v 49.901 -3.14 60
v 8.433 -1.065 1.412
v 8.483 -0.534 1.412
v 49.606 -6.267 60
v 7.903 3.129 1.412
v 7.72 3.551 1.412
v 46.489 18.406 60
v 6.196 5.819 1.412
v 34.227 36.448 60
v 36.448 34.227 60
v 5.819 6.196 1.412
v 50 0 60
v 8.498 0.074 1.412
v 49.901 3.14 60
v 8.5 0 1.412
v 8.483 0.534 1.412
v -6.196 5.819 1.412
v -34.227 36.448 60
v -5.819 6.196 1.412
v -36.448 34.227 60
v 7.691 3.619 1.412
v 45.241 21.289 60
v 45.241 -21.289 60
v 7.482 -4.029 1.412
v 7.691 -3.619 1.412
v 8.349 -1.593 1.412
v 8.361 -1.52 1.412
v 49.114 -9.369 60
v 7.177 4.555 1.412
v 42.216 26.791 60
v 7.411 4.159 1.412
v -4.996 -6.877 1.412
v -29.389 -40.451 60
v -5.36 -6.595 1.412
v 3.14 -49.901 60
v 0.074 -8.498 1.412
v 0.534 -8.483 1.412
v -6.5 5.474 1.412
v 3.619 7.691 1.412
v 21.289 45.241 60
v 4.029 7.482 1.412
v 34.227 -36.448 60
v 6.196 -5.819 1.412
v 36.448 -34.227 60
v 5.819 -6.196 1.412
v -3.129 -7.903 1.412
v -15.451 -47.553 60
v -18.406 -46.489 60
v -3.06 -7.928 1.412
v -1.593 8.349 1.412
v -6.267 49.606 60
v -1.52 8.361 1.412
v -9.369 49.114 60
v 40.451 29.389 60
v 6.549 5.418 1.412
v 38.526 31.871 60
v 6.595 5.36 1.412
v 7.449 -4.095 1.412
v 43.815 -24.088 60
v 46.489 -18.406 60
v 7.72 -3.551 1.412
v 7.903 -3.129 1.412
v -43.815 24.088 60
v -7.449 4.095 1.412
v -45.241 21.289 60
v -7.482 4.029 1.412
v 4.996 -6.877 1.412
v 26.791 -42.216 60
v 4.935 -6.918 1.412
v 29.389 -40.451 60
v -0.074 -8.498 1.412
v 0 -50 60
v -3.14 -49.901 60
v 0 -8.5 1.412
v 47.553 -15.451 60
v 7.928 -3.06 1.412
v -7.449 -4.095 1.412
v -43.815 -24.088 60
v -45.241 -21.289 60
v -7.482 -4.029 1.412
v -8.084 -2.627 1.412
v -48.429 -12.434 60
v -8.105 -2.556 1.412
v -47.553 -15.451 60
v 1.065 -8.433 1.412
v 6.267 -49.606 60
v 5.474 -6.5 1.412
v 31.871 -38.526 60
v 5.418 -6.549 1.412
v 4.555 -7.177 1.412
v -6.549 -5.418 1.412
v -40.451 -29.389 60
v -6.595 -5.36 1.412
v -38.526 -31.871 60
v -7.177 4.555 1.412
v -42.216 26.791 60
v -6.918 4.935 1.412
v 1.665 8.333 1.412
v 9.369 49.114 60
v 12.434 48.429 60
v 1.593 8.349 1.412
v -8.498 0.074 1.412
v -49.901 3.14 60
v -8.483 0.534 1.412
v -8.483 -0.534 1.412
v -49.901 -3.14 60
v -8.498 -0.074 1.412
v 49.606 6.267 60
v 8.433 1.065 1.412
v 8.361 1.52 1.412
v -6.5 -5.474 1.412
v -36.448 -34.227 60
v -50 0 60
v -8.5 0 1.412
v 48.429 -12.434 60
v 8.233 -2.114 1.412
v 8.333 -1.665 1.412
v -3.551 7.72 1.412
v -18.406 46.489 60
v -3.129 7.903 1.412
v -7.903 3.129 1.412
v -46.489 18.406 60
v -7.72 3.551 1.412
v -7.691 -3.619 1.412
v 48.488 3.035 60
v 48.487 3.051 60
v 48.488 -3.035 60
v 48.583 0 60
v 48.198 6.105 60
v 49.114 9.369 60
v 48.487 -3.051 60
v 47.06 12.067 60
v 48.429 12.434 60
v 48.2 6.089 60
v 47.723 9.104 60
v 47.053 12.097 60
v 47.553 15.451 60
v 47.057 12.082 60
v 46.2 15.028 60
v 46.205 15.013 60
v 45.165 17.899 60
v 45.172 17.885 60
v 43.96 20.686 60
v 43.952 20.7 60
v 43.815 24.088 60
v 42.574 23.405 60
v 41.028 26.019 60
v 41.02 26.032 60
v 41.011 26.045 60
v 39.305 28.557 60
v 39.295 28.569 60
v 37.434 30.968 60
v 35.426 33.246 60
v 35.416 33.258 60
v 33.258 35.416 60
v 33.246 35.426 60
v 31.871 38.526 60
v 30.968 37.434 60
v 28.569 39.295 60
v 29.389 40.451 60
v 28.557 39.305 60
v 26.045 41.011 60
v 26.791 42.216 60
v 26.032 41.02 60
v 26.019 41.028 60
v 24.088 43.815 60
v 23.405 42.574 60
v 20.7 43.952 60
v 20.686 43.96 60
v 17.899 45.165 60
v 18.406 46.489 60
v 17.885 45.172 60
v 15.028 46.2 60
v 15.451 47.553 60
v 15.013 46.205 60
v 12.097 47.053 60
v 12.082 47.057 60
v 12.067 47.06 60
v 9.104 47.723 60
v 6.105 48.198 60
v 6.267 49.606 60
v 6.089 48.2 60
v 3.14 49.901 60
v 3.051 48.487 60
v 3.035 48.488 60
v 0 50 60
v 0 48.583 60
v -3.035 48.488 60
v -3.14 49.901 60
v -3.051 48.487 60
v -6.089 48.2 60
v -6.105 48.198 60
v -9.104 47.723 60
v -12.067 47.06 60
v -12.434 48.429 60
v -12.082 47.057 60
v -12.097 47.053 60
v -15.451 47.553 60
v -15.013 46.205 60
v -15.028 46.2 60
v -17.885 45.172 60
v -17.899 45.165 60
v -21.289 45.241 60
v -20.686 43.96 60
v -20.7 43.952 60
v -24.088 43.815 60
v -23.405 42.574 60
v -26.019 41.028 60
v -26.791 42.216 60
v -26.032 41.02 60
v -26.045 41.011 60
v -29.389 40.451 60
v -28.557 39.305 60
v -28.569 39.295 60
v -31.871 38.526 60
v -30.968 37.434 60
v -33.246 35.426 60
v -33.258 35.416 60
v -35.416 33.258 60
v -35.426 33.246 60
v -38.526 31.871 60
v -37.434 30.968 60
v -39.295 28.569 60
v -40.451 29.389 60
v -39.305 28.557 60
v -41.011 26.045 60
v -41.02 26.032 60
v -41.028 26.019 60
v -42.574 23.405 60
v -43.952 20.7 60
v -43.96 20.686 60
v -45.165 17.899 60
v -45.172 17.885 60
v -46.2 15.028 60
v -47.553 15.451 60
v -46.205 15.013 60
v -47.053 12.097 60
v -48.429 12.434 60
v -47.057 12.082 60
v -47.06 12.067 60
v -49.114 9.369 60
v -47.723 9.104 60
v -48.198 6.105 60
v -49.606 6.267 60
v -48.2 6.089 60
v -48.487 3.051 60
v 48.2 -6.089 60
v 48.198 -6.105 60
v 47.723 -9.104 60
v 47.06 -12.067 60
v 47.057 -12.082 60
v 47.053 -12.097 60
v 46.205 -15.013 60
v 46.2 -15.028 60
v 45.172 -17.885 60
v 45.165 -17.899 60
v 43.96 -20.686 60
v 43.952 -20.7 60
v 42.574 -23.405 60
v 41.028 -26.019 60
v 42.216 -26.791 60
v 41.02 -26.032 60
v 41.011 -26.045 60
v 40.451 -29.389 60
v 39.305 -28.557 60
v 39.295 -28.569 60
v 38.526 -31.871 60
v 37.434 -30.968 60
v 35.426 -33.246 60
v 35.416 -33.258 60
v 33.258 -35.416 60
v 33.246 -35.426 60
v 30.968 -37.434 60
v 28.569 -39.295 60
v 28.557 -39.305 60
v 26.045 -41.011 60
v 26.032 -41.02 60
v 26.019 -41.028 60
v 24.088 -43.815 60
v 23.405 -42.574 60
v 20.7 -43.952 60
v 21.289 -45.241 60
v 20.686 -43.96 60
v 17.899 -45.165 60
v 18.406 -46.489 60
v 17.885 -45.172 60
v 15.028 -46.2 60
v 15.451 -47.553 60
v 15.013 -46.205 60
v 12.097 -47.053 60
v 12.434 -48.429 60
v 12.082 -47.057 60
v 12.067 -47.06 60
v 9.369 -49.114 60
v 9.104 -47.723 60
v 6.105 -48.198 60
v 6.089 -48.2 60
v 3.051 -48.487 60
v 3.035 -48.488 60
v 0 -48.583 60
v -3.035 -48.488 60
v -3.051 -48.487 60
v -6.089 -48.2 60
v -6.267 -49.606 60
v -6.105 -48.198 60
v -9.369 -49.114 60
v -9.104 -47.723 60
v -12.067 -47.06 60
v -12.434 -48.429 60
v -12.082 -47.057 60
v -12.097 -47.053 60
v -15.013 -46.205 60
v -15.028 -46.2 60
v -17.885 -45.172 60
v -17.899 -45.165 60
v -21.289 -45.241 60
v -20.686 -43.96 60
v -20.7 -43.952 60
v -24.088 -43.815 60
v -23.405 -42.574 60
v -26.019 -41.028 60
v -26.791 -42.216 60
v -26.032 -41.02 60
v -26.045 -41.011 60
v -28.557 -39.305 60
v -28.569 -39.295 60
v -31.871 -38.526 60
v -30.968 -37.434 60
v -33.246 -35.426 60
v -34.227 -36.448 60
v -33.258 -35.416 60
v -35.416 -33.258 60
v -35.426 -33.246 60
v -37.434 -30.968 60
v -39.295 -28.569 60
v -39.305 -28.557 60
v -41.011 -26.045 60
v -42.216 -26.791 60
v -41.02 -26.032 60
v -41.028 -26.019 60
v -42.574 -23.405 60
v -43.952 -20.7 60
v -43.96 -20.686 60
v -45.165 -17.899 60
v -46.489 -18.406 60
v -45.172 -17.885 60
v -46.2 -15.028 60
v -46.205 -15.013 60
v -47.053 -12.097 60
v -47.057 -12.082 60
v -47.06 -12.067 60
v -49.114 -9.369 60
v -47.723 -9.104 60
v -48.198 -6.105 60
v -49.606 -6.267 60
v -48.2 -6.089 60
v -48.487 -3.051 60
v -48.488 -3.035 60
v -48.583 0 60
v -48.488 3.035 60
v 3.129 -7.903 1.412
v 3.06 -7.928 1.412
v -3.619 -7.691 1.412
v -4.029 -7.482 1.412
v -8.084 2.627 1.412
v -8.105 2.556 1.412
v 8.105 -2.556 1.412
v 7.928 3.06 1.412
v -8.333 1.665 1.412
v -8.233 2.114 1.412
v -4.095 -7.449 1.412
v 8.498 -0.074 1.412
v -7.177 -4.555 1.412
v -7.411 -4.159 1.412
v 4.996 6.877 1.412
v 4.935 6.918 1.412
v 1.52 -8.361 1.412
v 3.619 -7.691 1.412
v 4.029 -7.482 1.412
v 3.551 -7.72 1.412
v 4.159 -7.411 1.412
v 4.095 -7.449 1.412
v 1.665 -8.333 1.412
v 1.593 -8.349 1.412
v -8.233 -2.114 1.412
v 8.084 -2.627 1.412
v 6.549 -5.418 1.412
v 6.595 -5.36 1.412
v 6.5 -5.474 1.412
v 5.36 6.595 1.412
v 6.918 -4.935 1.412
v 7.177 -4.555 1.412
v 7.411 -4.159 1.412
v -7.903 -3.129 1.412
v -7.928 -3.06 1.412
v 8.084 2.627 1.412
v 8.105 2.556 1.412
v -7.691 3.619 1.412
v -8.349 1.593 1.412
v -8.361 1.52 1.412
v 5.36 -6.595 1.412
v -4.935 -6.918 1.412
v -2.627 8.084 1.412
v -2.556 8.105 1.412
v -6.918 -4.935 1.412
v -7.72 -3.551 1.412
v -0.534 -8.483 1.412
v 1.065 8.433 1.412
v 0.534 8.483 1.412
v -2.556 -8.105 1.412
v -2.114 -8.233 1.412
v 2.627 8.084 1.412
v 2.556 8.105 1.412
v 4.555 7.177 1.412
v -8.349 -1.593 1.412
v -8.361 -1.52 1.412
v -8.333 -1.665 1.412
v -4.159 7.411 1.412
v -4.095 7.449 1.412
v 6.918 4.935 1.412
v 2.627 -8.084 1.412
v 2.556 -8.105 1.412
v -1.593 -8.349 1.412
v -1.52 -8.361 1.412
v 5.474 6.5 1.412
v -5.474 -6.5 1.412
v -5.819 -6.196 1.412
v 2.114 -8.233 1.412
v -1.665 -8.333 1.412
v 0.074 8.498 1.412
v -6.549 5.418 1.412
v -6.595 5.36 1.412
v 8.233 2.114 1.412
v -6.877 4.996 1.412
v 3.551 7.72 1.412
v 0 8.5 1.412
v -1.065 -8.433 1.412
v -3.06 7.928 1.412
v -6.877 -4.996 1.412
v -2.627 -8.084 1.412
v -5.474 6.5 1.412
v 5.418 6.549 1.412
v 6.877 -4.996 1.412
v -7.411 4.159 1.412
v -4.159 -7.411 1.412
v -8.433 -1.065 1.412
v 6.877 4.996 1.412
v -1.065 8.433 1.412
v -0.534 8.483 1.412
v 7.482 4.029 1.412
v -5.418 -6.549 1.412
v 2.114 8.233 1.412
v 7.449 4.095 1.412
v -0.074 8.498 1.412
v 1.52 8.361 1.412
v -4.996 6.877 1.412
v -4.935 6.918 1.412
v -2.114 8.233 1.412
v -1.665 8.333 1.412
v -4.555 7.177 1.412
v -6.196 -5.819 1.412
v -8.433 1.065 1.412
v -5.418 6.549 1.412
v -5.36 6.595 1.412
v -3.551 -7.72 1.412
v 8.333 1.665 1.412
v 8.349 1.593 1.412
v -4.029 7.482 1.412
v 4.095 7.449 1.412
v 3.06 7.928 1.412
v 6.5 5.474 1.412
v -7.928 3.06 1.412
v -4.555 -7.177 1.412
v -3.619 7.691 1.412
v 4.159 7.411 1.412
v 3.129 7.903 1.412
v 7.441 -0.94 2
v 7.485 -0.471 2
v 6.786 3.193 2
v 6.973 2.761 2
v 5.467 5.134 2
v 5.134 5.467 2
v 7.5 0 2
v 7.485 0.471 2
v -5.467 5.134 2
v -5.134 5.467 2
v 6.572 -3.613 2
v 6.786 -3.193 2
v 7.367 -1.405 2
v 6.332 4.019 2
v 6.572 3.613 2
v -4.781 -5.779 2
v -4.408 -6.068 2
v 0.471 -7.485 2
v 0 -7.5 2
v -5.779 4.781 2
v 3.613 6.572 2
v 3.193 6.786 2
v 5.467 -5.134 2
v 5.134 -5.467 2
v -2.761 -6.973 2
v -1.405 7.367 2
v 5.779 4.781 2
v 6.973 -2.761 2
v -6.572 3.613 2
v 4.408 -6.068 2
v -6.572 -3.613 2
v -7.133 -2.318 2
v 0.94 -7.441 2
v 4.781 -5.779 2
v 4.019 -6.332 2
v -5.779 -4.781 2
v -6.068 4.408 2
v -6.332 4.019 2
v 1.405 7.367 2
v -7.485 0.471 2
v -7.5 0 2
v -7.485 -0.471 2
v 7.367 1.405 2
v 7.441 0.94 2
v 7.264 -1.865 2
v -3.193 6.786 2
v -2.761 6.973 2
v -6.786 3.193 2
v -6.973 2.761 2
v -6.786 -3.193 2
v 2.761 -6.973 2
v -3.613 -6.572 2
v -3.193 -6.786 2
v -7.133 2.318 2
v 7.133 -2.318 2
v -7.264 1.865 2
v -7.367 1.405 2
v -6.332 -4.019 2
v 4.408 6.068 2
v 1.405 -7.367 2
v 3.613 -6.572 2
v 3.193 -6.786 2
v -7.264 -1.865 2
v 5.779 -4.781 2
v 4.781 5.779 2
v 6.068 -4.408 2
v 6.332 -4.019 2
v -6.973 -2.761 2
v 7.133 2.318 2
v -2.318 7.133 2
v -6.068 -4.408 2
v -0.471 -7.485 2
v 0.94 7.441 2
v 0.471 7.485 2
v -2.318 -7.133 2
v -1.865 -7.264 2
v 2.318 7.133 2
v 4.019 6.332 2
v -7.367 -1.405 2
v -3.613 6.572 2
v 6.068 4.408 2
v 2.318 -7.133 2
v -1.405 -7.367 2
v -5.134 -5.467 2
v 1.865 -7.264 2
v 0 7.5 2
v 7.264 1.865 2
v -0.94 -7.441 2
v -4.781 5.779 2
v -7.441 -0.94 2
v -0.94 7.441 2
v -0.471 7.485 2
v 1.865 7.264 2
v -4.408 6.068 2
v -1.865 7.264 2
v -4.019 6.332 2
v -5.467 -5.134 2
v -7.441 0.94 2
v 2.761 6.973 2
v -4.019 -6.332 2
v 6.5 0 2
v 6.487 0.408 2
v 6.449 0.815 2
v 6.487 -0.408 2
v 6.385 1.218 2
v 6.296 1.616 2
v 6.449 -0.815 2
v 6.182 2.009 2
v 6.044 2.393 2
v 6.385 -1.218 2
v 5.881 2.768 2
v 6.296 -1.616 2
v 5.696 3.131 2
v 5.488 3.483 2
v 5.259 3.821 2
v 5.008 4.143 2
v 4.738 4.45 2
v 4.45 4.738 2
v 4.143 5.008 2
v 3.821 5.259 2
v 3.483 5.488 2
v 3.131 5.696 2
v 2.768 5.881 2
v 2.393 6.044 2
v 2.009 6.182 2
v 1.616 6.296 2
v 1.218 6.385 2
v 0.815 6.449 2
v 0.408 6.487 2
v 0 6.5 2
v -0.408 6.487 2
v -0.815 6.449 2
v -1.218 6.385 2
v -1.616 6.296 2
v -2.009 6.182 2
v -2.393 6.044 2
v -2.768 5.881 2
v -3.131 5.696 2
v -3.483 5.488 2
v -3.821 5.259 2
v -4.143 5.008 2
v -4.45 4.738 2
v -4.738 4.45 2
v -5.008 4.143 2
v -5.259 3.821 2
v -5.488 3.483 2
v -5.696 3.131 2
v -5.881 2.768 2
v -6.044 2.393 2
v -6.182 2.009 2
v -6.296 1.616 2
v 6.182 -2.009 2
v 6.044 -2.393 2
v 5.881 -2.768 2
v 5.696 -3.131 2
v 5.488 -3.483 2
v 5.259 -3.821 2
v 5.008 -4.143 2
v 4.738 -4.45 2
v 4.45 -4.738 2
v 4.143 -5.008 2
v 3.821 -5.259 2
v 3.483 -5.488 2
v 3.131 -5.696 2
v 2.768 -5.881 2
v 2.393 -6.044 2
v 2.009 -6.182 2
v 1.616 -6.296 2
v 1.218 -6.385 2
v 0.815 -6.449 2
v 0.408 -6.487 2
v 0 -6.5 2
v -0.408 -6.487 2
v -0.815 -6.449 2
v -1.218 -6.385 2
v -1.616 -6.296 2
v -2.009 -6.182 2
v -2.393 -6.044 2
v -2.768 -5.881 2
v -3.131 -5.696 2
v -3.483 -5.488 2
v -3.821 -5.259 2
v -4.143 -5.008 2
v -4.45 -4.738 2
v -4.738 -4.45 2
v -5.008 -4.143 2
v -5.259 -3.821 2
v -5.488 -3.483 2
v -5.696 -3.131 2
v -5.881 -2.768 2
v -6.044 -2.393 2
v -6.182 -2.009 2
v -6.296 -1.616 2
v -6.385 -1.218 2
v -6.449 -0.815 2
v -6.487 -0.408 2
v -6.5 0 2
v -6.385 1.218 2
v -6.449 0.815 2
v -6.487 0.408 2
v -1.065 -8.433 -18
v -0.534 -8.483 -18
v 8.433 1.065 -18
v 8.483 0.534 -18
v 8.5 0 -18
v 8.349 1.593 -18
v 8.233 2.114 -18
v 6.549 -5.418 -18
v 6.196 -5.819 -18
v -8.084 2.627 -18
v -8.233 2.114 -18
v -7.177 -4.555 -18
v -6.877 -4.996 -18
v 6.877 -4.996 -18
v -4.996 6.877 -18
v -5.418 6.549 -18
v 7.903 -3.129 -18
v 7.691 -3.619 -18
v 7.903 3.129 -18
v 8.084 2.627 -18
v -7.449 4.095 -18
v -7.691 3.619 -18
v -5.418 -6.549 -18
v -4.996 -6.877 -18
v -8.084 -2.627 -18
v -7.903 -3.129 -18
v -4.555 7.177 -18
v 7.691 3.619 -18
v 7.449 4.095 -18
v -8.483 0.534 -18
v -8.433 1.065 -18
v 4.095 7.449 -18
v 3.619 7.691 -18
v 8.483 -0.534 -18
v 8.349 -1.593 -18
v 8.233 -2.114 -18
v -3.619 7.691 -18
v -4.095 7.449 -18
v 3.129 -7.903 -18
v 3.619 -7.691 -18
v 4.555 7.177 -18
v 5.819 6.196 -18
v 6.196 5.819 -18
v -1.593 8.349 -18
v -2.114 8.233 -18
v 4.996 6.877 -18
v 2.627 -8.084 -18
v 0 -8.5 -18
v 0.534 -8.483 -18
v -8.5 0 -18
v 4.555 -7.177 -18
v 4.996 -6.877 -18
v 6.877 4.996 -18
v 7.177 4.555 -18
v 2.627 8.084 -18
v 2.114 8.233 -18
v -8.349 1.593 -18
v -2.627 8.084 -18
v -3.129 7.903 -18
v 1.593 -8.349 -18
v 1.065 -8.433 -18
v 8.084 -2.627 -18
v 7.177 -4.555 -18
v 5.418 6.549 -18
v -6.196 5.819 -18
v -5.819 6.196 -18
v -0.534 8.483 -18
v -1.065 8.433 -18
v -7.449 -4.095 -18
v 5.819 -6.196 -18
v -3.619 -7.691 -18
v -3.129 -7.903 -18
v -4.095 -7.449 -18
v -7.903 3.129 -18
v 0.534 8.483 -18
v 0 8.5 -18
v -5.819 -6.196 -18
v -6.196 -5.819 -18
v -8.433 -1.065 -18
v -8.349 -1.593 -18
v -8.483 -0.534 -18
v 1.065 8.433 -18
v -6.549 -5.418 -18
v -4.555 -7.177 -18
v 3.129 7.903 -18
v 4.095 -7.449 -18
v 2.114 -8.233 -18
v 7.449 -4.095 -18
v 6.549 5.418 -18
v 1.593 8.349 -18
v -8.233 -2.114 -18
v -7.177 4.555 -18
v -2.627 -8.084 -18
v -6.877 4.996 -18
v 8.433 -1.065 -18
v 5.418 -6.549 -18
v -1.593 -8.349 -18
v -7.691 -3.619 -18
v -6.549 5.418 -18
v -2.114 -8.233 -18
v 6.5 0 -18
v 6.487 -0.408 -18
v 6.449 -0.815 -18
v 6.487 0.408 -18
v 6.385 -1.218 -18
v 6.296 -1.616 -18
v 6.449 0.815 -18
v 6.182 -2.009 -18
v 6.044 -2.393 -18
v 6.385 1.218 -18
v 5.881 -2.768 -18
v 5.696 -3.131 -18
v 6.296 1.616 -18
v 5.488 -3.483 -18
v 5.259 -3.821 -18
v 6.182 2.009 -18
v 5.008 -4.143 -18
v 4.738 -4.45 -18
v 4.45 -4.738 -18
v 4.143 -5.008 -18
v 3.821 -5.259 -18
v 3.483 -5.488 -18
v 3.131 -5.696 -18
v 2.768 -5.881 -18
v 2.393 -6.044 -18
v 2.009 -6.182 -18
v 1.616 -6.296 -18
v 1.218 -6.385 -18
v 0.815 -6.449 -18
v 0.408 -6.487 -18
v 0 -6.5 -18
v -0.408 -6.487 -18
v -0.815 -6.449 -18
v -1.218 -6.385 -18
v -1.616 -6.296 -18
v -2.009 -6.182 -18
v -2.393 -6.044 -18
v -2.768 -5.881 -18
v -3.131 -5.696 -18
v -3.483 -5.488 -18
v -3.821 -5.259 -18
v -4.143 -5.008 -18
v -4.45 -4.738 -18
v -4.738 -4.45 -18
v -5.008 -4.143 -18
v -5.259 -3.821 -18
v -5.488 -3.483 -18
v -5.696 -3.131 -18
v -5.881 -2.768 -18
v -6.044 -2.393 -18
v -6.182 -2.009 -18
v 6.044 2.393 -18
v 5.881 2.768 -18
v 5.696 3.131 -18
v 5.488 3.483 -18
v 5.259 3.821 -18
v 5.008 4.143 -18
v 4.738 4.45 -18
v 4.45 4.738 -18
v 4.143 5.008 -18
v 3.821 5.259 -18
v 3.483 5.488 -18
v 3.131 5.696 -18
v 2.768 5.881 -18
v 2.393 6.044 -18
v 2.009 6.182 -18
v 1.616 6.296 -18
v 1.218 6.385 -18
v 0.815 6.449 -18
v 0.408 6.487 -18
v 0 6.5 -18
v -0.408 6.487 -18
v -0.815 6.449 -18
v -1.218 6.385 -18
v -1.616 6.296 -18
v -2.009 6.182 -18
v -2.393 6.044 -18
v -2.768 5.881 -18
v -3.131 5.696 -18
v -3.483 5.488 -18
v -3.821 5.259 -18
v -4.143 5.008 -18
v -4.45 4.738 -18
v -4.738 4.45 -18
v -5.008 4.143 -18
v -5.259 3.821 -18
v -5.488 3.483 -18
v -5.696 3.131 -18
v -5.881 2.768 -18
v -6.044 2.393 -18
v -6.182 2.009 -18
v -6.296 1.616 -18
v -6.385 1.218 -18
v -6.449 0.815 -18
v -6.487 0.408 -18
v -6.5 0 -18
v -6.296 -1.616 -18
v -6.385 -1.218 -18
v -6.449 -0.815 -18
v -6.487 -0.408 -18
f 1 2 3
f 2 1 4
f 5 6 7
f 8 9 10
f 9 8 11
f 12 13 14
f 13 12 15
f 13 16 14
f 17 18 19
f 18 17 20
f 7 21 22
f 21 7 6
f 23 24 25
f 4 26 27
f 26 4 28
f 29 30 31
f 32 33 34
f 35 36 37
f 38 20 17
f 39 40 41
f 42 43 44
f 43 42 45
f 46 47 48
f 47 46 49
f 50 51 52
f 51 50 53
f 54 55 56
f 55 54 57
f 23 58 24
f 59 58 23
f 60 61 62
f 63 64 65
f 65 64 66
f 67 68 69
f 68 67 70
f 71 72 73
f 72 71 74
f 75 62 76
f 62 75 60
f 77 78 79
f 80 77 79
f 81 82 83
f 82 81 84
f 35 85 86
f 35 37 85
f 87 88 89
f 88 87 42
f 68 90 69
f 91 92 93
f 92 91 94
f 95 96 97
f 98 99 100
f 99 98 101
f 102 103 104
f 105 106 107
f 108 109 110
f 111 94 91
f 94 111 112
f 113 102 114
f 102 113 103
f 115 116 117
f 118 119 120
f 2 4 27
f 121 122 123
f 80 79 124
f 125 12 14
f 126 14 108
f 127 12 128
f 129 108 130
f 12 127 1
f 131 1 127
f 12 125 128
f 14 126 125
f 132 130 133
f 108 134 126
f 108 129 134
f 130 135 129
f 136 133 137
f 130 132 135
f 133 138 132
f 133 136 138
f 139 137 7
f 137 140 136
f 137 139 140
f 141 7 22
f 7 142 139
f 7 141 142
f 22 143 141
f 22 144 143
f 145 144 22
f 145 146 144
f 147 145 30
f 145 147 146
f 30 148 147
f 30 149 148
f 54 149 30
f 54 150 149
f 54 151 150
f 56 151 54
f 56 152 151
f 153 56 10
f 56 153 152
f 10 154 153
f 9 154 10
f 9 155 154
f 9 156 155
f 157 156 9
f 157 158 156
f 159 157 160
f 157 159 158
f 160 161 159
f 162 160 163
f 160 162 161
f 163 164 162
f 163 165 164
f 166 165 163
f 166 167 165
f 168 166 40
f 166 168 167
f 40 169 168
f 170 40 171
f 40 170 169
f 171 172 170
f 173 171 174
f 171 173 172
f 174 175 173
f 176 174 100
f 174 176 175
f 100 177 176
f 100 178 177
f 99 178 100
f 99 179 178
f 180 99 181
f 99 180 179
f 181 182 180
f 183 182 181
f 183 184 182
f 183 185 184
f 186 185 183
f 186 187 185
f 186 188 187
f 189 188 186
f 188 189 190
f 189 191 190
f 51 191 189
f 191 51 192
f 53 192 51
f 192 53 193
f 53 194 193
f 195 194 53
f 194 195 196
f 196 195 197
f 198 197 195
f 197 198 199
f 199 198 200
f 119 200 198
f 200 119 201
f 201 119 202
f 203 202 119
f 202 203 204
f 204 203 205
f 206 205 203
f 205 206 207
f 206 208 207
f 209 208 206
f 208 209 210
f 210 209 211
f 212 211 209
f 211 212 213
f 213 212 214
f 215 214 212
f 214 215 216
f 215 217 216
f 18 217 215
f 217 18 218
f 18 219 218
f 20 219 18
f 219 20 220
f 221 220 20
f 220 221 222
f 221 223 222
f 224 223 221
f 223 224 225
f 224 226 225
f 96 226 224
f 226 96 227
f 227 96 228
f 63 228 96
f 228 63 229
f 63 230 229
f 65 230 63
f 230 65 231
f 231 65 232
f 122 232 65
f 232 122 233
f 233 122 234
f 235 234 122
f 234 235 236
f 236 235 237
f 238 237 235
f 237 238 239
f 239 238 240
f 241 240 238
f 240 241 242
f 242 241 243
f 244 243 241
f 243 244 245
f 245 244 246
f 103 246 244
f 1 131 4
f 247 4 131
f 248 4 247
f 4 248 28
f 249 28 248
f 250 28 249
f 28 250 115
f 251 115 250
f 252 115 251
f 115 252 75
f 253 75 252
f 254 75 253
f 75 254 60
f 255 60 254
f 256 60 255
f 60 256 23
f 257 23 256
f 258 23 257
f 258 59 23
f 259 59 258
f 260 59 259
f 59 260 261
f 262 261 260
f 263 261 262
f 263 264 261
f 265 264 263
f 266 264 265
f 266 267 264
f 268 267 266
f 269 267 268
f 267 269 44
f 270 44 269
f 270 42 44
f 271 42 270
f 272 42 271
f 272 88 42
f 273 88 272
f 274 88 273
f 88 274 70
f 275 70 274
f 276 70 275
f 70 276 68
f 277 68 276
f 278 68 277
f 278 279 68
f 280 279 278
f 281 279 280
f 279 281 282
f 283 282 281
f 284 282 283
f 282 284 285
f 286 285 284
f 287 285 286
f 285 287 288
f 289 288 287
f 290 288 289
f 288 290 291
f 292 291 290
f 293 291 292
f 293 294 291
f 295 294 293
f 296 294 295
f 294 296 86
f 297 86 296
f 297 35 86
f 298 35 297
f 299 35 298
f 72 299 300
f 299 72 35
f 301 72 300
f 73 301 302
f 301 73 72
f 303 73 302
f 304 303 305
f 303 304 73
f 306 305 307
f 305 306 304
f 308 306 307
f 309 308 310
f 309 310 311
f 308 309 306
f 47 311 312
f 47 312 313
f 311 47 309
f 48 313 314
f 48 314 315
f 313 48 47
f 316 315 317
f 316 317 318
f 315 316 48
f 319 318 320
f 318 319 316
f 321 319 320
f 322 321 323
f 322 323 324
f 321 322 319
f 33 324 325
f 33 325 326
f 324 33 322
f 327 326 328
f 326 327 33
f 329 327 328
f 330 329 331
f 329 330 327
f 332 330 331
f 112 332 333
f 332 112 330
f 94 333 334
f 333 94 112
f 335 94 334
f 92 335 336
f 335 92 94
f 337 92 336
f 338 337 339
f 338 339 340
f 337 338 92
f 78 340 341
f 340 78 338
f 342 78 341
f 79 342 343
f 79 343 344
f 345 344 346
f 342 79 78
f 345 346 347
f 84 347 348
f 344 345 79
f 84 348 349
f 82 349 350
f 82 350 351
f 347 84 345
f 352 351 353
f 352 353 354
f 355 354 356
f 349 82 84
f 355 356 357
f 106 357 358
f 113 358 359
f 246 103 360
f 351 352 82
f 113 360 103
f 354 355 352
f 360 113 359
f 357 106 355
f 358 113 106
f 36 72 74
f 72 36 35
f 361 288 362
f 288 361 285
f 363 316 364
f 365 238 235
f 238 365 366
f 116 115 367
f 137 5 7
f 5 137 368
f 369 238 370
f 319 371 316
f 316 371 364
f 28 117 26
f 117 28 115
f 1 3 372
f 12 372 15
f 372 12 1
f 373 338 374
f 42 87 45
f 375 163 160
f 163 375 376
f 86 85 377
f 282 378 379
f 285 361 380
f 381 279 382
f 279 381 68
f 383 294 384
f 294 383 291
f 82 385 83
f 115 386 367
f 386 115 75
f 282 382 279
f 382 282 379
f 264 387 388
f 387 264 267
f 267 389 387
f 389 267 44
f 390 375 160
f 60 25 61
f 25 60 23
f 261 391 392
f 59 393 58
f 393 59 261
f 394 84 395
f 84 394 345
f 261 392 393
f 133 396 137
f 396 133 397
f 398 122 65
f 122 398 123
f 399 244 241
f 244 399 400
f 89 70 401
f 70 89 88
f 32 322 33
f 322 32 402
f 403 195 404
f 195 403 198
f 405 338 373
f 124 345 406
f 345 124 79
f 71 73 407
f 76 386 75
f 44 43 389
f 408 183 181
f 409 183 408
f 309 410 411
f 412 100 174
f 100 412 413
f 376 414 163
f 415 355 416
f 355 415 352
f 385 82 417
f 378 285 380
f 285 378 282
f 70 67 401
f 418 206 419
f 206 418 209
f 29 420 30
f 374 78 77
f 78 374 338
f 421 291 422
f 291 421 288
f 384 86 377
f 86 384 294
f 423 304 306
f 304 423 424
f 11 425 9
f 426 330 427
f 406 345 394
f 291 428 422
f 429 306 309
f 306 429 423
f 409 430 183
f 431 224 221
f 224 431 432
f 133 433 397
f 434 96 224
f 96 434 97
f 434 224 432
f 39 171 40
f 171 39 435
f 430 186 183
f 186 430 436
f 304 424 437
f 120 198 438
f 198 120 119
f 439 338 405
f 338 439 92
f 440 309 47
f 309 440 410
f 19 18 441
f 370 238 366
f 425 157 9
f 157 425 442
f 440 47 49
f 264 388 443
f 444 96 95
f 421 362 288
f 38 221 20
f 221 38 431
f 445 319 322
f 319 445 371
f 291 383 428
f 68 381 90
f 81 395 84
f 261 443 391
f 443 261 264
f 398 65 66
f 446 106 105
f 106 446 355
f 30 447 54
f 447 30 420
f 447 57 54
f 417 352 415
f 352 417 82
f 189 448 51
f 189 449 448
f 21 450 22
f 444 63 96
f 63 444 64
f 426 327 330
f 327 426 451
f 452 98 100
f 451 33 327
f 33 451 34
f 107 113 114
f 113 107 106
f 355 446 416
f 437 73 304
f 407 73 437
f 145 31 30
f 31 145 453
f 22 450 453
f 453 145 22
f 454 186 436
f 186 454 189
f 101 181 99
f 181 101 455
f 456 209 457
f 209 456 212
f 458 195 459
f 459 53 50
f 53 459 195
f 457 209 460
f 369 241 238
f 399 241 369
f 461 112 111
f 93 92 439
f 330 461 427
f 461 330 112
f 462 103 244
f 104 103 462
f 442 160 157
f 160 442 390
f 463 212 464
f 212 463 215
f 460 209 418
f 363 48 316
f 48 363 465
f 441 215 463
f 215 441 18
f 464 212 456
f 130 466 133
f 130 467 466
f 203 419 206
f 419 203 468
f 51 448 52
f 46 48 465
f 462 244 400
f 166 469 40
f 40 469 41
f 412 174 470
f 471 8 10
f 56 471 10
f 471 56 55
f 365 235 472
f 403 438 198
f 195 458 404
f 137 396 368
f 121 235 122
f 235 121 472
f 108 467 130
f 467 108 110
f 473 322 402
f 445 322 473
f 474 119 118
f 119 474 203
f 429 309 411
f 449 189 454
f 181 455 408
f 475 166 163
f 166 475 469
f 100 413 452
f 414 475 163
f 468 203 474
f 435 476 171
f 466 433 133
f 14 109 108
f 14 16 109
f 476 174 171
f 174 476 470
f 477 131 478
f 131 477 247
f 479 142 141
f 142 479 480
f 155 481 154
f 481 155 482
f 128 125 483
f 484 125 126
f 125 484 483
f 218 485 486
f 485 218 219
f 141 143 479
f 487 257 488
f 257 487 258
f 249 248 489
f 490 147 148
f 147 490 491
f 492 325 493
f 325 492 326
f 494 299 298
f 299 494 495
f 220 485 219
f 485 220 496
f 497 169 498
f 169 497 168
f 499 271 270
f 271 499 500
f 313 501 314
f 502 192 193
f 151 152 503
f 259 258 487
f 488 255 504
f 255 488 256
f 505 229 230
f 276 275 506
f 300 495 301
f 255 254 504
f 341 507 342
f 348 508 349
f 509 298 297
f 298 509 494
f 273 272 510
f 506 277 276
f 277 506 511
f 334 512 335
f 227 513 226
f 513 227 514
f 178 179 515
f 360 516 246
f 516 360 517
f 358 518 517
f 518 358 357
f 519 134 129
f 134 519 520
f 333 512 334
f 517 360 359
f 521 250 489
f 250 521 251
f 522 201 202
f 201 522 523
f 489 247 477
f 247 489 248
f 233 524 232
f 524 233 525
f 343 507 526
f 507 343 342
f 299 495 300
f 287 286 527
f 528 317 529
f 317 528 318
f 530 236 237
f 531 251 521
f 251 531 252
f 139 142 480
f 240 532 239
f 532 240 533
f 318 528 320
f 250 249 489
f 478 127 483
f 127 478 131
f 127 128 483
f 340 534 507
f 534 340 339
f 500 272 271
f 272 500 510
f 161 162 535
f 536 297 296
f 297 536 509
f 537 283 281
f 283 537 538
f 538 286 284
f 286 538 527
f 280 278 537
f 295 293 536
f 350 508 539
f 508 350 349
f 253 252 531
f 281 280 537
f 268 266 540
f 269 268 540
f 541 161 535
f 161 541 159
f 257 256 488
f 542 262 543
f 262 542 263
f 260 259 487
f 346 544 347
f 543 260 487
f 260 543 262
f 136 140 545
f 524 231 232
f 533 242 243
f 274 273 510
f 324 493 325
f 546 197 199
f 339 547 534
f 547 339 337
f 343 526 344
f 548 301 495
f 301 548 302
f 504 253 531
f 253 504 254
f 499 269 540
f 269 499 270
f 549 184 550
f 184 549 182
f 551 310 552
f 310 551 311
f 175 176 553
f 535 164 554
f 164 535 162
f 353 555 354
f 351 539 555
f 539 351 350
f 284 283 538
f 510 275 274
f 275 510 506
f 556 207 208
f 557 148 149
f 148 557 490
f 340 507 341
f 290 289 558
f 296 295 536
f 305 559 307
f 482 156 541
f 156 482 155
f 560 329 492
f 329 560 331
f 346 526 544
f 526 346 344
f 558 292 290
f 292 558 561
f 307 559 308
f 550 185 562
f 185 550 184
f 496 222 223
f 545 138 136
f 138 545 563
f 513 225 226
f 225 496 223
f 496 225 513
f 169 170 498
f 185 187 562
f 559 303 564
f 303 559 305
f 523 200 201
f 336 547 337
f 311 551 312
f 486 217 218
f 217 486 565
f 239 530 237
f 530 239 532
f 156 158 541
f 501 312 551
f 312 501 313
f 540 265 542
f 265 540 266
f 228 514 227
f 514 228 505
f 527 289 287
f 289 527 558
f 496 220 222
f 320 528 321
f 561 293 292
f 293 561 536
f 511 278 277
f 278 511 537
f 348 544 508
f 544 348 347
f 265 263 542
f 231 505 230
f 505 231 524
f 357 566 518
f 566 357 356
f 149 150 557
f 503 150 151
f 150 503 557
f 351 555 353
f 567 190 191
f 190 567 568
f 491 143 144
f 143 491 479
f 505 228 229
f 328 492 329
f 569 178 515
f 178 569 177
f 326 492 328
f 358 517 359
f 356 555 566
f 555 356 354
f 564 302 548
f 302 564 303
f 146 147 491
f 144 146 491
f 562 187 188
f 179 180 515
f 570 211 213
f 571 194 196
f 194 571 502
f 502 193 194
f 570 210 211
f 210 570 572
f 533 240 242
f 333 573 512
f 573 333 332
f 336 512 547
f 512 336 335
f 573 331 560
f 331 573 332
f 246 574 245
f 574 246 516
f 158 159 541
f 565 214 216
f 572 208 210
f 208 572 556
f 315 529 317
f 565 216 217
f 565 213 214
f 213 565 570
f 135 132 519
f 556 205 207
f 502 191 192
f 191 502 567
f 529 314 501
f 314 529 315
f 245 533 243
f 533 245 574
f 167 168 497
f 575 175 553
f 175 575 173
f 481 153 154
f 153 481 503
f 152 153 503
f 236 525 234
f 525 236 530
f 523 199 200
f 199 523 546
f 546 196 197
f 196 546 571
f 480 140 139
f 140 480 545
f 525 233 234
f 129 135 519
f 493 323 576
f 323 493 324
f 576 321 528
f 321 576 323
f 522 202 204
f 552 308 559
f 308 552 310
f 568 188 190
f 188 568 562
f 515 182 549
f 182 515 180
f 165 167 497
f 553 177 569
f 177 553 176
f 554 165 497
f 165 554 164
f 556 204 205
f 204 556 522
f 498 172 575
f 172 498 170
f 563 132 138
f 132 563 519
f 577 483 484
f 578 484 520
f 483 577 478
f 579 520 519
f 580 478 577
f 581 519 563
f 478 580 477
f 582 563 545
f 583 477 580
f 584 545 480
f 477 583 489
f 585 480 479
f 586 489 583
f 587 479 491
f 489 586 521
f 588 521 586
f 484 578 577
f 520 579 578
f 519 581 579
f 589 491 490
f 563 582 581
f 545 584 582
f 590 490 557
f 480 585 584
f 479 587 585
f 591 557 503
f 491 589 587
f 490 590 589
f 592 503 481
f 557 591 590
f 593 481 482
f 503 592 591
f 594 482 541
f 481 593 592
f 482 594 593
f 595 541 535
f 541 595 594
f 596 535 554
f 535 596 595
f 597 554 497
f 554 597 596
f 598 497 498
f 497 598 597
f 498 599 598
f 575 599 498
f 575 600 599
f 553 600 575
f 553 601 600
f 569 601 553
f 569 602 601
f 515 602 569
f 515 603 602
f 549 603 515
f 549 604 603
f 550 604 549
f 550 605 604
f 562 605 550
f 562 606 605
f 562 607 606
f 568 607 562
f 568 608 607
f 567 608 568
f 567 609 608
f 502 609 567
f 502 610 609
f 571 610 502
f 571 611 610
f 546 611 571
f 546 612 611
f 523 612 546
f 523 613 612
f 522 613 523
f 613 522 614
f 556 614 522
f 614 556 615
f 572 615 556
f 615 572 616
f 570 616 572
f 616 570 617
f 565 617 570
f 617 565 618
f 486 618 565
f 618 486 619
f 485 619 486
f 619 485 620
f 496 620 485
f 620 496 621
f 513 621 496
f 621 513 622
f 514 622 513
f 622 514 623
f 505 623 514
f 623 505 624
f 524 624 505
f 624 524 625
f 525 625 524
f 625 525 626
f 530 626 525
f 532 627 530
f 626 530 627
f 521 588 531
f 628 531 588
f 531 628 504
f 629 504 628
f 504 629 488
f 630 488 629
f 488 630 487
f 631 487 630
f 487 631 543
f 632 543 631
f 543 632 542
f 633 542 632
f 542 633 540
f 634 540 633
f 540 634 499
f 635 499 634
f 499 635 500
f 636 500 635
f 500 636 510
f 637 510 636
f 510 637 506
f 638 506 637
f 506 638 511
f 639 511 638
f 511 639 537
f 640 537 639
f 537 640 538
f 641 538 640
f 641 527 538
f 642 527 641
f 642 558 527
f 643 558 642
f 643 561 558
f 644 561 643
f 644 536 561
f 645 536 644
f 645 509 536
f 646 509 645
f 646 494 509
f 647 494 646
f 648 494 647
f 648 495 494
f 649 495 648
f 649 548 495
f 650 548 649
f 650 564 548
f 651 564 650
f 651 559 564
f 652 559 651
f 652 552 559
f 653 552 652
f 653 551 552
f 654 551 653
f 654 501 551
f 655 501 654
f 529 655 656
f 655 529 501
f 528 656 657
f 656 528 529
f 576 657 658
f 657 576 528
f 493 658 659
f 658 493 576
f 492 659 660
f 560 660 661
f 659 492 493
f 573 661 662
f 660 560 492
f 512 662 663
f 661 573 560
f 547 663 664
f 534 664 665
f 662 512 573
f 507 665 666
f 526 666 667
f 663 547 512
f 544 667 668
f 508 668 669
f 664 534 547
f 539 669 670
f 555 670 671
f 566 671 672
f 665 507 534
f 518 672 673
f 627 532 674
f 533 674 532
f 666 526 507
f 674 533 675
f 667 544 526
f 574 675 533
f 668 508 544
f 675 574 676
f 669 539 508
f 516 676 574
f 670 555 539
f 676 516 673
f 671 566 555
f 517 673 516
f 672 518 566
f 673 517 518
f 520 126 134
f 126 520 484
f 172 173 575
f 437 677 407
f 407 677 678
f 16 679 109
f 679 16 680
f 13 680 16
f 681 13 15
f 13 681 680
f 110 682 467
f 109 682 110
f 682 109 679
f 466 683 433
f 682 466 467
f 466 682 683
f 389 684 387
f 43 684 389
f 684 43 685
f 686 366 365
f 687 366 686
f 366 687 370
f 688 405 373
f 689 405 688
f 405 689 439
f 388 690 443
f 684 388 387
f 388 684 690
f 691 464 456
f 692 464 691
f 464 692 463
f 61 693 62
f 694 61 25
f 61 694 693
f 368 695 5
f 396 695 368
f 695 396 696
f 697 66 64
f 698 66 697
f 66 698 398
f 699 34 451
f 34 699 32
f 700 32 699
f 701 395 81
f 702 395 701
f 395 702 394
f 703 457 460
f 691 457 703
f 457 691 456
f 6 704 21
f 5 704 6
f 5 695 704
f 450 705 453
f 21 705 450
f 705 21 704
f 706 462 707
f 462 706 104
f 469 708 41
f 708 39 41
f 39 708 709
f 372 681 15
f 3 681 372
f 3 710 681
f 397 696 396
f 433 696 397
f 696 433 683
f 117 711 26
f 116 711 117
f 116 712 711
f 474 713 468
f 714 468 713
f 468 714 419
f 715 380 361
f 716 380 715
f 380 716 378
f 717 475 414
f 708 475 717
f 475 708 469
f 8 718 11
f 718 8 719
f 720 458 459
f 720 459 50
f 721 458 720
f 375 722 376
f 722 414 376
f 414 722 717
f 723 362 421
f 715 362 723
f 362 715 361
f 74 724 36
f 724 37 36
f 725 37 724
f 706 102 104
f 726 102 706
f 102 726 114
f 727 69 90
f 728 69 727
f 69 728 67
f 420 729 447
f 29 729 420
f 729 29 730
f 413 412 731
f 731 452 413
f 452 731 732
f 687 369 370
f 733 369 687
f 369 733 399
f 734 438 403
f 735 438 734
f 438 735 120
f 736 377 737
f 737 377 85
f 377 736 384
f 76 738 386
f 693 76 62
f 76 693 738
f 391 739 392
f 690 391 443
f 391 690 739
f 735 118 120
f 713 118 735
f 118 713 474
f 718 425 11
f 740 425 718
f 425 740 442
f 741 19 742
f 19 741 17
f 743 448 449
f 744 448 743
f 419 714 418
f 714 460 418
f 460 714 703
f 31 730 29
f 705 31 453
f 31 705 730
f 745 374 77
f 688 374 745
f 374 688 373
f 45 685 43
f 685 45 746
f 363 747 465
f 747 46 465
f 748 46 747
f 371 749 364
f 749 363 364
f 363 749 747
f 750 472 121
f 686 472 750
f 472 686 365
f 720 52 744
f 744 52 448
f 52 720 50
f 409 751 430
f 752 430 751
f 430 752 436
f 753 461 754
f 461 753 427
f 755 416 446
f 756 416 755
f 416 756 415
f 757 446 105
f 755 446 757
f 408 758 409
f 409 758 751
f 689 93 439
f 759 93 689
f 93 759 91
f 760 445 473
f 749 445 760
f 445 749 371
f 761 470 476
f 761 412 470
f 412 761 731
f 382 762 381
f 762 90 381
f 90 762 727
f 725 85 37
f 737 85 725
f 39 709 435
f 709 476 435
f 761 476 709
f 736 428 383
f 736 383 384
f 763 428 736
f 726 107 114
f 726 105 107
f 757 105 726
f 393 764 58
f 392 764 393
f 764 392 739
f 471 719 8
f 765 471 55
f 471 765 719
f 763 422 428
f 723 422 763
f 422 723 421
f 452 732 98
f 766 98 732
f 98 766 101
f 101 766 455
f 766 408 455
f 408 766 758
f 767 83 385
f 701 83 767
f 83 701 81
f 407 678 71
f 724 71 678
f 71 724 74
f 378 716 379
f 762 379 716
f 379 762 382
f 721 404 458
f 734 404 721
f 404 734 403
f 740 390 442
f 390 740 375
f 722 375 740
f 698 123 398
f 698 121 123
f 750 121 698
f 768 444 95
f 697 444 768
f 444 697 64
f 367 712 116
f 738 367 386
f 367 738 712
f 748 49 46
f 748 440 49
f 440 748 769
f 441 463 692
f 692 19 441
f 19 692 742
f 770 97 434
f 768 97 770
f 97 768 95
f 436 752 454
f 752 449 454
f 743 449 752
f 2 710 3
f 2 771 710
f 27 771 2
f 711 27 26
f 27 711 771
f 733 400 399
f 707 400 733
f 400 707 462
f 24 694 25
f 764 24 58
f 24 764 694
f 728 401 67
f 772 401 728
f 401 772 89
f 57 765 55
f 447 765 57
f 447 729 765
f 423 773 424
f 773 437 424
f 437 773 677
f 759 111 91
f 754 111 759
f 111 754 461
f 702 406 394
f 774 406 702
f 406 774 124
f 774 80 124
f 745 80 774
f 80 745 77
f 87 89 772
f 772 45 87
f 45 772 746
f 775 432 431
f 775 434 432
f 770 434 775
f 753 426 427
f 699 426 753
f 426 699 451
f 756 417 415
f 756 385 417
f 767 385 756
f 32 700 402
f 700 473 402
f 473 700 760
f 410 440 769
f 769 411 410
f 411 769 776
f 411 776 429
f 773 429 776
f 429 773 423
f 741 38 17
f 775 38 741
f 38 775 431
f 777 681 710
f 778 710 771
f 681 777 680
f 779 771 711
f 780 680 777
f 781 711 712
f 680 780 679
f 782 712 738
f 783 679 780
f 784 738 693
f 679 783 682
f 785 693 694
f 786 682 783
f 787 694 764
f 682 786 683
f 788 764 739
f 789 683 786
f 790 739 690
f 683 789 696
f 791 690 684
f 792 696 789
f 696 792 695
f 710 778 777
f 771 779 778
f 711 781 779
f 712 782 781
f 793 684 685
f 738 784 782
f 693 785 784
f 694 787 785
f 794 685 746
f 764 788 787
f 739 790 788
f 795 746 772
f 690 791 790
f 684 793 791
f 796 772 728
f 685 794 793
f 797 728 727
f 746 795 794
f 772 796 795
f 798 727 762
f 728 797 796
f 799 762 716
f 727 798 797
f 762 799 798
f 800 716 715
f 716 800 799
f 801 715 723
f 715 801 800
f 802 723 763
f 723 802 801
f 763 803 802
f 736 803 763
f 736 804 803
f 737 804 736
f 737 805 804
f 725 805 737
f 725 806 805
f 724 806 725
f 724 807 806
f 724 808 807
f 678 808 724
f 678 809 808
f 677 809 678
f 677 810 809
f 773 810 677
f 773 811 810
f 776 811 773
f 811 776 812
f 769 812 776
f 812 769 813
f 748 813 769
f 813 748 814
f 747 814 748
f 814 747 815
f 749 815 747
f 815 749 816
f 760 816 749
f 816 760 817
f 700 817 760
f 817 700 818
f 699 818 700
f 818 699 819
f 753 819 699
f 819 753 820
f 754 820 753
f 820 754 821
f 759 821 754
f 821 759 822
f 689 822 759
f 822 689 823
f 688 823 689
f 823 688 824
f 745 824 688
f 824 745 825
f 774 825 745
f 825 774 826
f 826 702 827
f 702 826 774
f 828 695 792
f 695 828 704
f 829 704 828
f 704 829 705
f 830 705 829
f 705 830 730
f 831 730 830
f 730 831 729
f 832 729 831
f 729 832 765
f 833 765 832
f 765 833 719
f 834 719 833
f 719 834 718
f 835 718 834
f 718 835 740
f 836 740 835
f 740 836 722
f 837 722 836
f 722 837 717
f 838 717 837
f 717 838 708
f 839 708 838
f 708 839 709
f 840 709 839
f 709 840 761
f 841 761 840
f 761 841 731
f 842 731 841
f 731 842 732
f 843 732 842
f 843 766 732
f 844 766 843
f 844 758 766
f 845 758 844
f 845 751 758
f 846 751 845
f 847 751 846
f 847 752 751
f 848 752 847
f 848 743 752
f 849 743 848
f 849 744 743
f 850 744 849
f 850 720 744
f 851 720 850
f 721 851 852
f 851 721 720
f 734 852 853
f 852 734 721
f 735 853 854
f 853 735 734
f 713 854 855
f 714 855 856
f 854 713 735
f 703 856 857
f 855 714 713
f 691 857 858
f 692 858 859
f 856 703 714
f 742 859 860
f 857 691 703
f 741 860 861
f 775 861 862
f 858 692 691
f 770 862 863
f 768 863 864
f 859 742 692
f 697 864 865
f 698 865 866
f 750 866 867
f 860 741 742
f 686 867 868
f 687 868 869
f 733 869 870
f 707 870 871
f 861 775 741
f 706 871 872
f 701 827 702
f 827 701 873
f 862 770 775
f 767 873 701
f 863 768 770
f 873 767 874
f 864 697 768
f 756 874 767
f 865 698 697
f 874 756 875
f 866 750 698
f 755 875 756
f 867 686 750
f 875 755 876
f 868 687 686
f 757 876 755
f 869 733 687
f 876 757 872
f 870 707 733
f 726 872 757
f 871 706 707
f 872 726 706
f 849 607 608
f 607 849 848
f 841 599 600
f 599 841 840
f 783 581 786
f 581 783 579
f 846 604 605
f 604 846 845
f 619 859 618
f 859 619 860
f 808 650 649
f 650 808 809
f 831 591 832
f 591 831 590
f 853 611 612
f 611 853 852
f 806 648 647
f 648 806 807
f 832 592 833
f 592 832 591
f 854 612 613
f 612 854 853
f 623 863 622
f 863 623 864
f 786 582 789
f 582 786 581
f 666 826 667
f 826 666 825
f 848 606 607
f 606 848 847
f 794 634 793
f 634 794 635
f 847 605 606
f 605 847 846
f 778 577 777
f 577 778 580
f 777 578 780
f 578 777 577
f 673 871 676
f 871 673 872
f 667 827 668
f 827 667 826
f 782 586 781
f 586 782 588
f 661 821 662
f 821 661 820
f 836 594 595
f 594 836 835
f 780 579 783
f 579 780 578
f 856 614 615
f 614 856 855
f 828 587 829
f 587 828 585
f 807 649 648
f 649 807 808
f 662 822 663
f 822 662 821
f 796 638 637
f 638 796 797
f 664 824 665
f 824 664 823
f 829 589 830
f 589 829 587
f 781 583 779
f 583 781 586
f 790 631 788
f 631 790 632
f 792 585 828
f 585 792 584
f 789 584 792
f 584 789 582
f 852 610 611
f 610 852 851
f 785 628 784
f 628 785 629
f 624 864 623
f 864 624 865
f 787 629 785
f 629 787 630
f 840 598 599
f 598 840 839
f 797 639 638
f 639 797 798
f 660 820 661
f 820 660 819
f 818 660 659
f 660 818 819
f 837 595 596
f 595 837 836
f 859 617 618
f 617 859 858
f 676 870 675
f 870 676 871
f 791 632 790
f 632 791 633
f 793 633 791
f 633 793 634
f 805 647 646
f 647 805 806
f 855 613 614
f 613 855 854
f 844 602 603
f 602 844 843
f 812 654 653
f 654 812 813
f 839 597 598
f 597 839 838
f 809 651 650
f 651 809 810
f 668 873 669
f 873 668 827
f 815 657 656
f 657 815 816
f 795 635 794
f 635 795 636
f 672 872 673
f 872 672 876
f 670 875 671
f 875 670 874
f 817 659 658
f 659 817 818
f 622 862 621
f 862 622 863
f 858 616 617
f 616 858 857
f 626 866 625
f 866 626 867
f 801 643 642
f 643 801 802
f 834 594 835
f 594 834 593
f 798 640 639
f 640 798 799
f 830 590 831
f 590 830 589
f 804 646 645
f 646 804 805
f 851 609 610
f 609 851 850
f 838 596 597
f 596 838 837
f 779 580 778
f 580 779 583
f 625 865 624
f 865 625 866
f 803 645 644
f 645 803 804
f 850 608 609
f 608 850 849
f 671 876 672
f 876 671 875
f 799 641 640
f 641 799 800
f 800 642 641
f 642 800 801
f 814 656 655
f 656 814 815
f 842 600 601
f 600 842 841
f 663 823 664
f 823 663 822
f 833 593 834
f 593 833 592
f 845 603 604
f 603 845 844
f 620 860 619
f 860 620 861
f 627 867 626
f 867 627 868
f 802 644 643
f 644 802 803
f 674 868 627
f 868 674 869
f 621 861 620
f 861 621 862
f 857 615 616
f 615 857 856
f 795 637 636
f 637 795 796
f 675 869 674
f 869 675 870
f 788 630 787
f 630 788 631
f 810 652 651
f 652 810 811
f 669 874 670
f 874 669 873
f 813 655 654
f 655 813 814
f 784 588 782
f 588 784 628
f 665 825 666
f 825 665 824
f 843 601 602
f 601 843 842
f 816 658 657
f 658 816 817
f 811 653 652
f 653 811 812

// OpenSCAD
//Feeder
$fn = 100;
//Skittle dimensions
DiameterOfSkittle = 13;
ThicknessOfSkittle = 9;

//Feeder dimensions
wallThickness = 2;
//bowl dimensions
topDiameter = 100;
botDiameter = DiameterOfSkittle + 2;
bowlHeight = 60;
//tube dimensions
tubeHeight = ThicknessOfSkittle*2;

difference(){
    union(){
        bowl();
        tube();
    }
    cavity();
}

module bowl(){
    difference(){    
        cylinder(d1=botDiameter,d2=topDiameter,h=bowlHeight);
        translate([0,0,wallThickness]) cylinder(d1=botDiameter,d2=topDiameter,h=bowlHeight);
    }
}


module tube(){
    translate([0,0,-tubeHeight])cylinder(d=botDiameter+wallThickness,h=tubeHeight+2);  
}

module cavity(){
    cylinder(d=DiameterOfSkittle,h=100,center=true);
}
